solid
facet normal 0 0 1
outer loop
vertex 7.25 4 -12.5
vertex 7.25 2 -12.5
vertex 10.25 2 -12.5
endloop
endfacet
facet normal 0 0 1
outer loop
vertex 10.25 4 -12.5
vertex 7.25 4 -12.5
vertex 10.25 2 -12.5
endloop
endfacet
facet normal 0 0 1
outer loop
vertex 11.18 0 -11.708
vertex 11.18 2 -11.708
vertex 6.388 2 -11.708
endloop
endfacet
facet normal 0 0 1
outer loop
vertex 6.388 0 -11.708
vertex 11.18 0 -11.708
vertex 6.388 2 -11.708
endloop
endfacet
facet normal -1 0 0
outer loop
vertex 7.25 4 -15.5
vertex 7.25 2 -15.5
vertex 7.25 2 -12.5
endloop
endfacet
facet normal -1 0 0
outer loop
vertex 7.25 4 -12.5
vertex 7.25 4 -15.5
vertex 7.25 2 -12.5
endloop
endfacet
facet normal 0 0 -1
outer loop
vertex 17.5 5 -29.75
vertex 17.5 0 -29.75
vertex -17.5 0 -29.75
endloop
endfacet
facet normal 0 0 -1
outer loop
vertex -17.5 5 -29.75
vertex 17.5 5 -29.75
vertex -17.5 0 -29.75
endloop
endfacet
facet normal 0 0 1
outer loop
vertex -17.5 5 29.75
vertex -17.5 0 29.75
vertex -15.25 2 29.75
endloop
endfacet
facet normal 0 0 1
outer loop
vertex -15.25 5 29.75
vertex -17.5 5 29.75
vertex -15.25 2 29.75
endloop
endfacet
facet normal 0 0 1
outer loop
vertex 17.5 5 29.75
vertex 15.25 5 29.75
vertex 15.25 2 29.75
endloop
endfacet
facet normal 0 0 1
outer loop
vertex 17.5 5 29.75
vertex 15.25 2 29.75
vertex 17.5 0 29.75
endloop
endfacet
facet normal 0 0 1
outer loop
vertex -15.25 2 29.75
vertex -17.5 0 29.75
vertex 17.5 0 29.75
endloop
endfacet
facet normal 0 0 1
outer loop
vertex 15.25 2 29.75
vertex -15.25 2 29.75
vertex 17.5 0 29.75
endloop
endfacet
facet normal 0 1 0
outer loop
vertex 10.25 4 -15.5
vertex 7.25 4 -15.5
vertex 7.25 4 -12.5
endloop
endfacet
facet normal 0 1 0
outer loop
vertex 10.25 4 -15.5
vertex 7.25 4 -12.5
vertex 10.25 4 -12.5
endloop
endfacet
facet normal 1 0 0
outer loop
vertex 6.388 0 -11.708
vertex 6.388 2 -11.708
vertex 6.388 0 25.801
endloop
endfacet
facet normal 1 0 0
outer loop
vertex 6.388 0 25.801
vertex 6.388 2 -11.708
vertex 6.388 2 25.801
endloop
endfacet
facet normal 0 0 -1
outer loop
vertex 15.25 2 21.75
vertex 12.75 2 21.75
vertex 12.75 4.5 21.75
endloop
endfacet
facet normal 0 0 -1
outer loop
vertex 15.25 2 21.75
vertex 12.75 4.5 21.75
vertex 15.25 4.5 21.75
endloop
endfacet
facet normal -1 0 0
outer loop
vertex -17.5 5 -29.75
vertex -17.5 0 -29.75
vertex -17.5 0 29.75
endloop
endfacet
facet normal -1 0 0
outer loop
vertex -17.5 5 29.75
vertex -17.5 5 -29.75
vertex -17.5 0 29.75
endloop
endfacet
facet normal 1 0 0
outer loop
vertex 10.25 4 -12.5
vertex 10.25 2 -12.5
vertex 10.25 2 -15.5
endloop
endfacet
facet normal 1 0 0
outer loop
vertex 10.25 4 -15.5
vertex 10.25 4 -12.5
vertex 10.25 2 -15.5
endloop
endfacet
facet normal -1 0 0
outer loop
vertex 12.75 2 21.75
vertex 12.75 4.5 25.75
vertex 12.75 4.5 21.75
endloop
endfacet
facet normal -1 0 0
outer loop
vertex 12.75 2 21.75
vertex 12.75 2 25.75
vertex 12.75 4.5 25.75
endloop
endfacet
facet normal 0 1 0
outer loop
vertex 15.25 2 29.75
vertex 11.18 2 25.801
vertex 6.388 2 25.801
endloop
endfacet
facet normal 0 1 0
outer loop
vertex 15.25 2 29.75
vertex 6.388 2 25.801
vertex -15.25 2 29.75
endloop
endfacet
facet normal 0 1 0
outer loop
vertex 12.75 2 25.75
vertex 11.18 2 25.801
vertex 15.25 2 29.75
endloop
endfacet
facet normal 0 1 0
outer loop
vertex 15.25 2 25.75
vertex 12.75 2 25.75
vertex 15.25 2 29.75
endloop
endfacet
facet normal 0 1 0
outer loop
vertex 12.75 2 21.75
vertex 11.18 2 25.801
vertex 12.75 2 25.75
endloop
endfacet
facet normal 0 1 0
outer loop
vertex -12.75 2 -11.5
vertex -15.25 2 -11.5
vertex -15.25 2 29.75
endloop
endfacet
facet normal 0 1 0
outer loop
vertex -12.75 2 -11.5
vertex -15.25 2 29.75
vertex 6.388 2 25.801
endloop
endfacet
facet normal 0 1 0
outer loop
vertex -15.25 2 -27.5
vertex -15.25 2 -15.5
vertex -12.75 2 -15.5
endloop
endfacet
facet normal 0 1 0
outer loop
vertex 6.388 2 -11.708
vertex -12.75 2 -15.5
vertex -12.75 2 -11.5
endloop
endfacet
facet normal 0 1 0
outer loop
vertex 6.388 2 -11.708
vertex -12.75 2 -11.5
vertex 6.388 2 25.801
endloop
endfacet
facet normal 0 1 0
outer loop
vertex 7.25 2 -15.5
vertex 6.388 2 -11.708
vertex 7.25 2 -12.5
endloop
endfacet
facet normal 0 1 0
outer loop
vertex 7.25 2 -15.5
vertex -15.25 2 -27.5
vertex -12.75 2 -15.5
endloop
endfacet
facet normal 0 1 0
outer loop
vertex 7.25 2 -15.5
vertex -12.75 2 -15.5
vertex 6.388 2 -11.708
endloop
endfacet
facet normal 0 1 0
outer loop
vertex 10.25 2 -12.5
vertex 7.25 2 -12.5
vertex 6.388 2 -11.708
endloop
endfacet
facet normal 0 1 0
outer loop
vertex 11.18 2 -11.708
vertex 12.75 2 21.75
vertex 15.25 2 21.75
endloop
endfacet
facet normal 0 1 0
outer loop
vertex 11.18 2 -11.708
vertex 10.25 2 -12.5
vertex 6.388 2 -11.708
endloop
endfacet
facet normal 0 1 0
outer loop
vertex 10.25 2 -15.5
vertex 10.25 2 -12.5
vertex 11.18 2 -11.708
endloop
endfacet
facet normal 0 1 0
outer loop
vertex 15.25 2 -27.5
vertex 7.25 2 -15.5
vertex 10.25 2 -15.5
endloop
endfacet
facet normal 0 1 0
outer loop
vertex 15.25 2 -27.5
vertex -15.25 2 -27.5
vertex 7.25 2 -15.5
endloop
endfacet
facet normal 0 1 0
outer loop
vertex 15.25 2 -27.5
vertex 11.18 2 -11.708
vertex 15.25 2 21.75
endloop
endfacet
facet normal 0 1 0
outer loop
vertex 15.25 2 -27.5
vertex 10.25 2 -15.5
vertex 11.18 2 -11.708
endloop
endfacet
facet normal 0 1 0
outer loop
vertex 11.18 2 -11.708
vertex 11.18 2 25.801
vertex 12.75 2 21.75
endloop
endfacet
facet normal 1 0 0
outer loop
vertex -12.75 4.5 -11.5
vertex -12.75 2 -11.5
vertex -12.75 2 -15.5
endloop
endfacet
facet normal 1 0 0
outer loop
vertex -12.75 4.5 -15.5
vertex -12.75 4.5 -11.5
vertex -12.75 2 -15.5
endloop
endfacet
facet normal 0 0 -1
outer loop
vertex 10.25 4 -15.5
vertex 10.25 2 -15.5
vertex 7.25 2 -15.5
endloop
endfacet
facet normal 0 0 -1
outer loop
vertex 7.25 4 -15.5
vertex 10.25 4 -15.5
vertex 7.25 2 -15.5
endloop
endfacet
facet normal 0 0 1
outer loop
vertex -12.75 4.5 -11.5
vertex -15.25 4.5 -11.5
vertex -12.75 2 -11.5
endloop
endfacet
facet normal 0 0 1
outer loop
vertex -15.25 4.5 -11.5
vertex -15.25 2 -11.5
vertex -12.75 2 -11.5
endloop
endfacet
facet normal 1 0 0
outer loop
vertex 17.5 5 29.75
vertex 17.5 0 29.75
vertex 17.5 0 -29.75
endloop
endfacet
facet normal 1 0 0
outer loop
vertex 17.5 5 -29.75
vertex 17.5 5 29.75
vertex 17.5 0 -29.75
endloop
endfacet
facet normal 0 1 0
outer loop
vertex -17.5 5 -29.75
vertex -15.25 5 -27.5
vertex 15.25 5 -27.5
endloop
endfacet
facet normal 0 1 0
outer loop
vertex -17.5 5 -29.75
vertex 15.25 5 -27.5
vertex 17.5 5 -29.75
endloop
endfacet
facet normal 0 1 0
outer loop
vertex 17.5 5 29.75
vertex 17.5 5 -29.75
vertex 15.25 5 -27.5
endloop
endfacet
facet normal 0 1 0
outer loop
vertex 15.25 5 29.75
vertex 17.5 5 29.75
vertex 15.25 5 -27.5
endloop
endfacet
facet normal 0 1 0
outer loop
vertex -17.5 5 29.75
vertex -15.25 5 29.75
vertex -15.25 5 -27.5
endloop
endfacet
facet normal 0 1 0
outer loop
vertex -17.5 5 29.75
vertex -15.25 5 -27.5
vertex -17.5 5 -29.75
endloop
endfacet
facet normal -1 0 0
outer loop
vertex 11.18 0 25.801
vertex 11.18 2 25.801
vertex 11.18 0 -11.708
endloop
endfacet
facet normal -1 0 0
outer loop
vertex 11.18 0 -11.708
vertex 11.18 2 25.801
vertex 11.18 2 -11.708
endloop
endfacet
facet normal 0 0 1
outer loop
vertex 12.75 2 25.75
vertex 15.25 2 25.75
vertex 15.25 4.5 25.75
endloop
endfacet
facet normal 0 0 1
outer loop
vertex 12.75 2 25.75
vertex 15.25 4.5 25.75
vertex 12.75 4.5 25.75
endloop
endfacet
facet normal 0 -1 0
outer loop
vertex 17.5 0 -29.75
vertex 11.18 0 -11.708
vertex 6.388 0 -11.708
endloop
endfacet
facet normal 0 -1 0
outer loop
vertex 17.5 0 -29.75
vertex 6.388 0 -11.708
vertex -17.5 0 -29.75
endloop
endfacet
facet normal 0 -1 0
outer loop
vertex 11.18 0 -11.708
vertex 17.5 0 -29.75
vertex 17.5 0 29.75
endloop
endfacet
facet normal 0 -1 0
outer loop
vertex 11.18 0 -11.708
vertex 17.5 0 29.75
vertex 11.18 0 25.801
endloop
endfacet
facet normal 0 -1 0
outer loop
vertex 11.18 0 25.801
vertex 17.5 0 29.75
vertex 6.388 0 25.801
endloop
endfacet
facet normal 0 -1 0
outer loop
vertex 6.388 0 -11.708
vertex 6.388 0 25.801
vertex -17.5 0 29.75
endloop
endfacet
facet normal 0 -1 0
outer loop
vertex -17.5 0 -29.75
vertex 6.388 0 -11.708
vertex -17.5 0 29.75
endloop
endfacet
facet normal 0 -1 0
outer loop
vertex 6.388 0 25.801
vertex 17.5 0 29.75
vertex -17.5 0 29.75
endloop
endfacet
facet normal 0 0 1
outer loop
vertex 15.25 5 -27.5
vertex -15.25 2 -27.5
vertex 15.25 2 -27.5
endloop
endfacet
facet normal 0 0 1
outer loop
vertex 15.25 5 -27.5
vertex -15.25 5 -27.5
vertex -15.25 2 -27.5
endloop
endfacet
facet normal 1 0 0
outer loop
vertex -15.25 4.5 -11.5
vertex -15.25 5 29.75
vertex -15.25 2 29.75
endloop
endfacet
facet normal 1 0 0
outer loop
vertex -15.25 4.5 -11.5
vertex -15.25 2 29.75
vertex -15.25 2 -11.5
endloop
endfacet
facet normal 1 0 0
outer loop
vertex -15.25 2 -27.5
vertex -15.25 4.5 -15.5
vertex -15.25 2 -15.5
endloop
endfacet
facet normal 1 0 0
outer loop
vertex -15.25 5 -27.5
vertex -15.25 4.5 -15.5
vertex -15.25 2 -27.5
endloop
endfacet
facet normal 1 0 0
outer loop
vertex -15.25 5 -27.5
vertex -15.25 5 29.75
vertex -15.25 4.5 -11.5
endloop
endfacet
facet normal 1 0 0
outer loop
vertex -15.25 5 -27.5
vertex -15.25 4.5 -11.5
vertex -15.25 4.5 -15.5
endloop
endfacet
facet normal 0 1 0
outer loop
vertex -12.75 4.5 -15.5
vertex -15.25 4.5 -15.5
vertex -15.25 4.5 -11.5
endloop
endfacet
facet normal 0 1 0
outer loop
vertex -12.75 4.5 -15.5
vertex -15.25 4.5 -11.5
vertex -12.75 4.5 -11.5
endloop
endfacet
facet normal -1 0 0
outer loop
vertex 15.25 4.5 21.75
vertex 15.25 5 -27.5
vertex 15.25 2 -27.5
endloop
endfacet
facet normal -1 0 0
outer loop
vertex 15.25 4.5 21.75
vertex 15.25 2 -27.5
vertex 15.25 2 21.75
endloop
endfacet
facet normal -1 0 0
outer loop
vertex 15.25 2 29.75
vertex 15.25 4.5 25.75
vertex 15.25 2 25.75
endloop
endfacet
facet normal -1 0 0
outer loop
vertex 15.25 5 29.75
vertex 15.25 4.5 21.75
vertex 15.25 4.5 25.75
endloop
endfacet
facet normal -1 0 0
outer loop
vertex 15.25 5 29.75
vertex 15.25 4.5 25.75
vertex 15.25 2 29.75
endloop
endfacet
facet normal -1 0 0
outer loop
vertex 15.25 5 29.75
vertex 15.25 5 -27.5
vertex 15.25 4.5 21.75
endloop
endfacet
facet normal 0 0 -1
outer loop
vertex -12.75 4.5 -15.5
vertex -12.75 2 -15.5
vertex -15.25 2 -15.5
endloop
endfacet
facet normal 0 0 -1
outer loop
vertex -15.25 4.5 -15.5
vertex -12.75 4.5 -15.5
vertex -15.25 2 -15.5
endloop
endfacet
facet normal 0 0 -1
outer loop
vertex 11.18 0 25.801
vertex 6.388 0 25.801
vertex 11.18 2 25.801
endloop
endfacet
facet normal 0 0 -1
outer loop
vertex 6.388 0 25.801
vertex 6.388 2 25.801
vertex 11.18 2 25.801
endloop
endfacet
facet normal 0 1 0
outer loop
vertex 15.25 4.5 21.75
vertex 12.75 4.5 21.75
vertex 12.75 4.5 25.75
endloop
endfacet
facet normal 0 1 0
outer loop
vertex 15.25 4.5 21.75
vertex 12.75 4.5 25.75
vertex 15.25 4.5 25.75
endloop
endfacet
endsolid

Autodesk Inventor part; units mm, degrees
ref_plane "YZ Plane" through (0, 0, 0) normal (1, 0, 0) x (0, 1, 0)
ref_plane "XZ Plane" through (0, 0, 0) normal (0, 1, 0) x (-1, 0, 0)
ref_plane "XY Plane" through (0, 0, 0) normal (0, 0, 1) x (1, 0, 0)
sketch "Sketch1" plane through (0, 0, 0) normal (0, 1, 0) x (-1, 0, 0)
  line L0 (-17.5, -29.75) -> (17.5, -29.75)
  line L1 (17.5, -29.75) -> (17.5, 29.75)
  line L2 (17.5, 29.75) -> (-17.5, 29.75)
  line L3 (-17.5, 29.75) -> (-17.5, -29.75)
  line L4 (-17.5, -29.75) -> (17.5, 29.75) construction
  line L5 (17.5, -29.75) -> (-17.5, 29.75) construction
  point P0 (0, 0)
  dimension "d0" = 59.5
  dimension "d1" = 35
extrude "Extrusion1" add sketch "Sketch1" along normal blind 5
sketch "Sketch2" plane through (0, 5, 0) normal (0, 1, 0) x (1, 0, 0)
  line L0 (-17.5, -29.75) -> (17.5, -29.75) projected
  line L1 (15.25, -29.75) -> (-15.25, -29.75)
  line L2 (-15.25, -29.75) -> (-15.25, 27.5)
  line L3 (-15.25, 27.5) -> (15.25, 27.5)
  line L4 (15.25, 27.5) -> (15.25, -29.75)
  line L5 (17.5, -29.75) -> (17.5, 29.75) projected
  line L6 (17.5, 29.75) -> (-17.5, 29.75) projected
  line L7 (-17.5, 29.75) -> (-17.5, -29.75) projected
  point P0 (0, 0)
  point P1 (-15.25, -29.75)
  dimension "d4" = 2.25
  dimension "d5" = 2.25
  dimension "d6" = 2.25
extrude "Extrusion2" cut sketch "Sketch2" against normal blind 3 contours L2 L3 L4 L0
sketch "Sketch3" plane through (0, 2, 0) normal (0, 1, 0) x (1, 0, 0)
  line L0 (10.25, 15.5) -> (7.25, 15.5)
  line L1 (7.25, 15.5) -> (7.25, 12.5)
  line L2 (7.25, 12.5) -> (10.25, 12.5)
  line L3 (10.25, 12.5) -> (10.25, 15.5)
  line L4 (-15.25, 27.5) -> (15.25, 27.5) projected
  line L5 (15.25, 27.5) -> (15.25, -29.75) projected
  line L6 (15.25, -25.75) -> (12.75, -25.75)
  line L7 (12.75, -25.75) -> (12.75, -21.75)
  line L8 (12.75, -21.75) -> (15.25, -21.75)
  line L9 (15.25, -21.75) -> (15.25, -25.75)
  line L10 (-15.25, -29.75) -> (-15.25, 27.5) projected
  line L11 (-15.25, 11.5) -> (-12.75, 11.5)
  line L12 (-12.75, 11.5) -> (-12.75, 15.5)
  line L13 (-12.75, 15.5) -> (-15.25, 15.5)
  line L14 (-15.25, 15.5) -> (-15.25, 11.5)
  line L15 (15.25, -29.75) -> (-15.25, -29.75) projected
  point P0 (0, 0)
  point P1 (15.25, -21.75)
  dimension "d9" = 3
  dimension "d10" = 3
  dimension "d21" = 12
  dimension "d22" = 5
  dimension "d23" = 2.5
  dimension "d24" = 4
  dimension "d25" = 4
  dimension "d26" = 2.5
  dimension "d27" = 12
  dimension "d28" = 4
extrude "Extrusion3" add sketch "Sketch3" along normal blind 2 contours L3 L2 L1 L0
extrude "Extrusion4" add sketch "Sketch3" along normal blind 2.5 contours L13 L12 L11 L10 | L5 L6 L7 L8
sketch "Sketch4" plane through (0, 2, 0) normal (0, 1, 0) x (1, 0, 0)
  line L0 (11.1804, 11.7081) -> (6.3882, 11.7081)
  line L1 (6.3882, 11.7081) -> (6.3882, -25.8012)
  line L2 (6.3882, -25.8012) -> (11.1804, -25.8012)
  line L3 (11.1804, -25.8012) -> (11.1804, 11.7081)
  point P0 (0, 0)
extrude "Extrusion5" cut sketch "Sketch4" against normal through all
equation "\"d5\" = d4"
equation "\"d6\" = d4"
equation "\"d25\" = d24"
equation "\"d26\" = d23"
properties part number "CROC Gluing Form V1"
